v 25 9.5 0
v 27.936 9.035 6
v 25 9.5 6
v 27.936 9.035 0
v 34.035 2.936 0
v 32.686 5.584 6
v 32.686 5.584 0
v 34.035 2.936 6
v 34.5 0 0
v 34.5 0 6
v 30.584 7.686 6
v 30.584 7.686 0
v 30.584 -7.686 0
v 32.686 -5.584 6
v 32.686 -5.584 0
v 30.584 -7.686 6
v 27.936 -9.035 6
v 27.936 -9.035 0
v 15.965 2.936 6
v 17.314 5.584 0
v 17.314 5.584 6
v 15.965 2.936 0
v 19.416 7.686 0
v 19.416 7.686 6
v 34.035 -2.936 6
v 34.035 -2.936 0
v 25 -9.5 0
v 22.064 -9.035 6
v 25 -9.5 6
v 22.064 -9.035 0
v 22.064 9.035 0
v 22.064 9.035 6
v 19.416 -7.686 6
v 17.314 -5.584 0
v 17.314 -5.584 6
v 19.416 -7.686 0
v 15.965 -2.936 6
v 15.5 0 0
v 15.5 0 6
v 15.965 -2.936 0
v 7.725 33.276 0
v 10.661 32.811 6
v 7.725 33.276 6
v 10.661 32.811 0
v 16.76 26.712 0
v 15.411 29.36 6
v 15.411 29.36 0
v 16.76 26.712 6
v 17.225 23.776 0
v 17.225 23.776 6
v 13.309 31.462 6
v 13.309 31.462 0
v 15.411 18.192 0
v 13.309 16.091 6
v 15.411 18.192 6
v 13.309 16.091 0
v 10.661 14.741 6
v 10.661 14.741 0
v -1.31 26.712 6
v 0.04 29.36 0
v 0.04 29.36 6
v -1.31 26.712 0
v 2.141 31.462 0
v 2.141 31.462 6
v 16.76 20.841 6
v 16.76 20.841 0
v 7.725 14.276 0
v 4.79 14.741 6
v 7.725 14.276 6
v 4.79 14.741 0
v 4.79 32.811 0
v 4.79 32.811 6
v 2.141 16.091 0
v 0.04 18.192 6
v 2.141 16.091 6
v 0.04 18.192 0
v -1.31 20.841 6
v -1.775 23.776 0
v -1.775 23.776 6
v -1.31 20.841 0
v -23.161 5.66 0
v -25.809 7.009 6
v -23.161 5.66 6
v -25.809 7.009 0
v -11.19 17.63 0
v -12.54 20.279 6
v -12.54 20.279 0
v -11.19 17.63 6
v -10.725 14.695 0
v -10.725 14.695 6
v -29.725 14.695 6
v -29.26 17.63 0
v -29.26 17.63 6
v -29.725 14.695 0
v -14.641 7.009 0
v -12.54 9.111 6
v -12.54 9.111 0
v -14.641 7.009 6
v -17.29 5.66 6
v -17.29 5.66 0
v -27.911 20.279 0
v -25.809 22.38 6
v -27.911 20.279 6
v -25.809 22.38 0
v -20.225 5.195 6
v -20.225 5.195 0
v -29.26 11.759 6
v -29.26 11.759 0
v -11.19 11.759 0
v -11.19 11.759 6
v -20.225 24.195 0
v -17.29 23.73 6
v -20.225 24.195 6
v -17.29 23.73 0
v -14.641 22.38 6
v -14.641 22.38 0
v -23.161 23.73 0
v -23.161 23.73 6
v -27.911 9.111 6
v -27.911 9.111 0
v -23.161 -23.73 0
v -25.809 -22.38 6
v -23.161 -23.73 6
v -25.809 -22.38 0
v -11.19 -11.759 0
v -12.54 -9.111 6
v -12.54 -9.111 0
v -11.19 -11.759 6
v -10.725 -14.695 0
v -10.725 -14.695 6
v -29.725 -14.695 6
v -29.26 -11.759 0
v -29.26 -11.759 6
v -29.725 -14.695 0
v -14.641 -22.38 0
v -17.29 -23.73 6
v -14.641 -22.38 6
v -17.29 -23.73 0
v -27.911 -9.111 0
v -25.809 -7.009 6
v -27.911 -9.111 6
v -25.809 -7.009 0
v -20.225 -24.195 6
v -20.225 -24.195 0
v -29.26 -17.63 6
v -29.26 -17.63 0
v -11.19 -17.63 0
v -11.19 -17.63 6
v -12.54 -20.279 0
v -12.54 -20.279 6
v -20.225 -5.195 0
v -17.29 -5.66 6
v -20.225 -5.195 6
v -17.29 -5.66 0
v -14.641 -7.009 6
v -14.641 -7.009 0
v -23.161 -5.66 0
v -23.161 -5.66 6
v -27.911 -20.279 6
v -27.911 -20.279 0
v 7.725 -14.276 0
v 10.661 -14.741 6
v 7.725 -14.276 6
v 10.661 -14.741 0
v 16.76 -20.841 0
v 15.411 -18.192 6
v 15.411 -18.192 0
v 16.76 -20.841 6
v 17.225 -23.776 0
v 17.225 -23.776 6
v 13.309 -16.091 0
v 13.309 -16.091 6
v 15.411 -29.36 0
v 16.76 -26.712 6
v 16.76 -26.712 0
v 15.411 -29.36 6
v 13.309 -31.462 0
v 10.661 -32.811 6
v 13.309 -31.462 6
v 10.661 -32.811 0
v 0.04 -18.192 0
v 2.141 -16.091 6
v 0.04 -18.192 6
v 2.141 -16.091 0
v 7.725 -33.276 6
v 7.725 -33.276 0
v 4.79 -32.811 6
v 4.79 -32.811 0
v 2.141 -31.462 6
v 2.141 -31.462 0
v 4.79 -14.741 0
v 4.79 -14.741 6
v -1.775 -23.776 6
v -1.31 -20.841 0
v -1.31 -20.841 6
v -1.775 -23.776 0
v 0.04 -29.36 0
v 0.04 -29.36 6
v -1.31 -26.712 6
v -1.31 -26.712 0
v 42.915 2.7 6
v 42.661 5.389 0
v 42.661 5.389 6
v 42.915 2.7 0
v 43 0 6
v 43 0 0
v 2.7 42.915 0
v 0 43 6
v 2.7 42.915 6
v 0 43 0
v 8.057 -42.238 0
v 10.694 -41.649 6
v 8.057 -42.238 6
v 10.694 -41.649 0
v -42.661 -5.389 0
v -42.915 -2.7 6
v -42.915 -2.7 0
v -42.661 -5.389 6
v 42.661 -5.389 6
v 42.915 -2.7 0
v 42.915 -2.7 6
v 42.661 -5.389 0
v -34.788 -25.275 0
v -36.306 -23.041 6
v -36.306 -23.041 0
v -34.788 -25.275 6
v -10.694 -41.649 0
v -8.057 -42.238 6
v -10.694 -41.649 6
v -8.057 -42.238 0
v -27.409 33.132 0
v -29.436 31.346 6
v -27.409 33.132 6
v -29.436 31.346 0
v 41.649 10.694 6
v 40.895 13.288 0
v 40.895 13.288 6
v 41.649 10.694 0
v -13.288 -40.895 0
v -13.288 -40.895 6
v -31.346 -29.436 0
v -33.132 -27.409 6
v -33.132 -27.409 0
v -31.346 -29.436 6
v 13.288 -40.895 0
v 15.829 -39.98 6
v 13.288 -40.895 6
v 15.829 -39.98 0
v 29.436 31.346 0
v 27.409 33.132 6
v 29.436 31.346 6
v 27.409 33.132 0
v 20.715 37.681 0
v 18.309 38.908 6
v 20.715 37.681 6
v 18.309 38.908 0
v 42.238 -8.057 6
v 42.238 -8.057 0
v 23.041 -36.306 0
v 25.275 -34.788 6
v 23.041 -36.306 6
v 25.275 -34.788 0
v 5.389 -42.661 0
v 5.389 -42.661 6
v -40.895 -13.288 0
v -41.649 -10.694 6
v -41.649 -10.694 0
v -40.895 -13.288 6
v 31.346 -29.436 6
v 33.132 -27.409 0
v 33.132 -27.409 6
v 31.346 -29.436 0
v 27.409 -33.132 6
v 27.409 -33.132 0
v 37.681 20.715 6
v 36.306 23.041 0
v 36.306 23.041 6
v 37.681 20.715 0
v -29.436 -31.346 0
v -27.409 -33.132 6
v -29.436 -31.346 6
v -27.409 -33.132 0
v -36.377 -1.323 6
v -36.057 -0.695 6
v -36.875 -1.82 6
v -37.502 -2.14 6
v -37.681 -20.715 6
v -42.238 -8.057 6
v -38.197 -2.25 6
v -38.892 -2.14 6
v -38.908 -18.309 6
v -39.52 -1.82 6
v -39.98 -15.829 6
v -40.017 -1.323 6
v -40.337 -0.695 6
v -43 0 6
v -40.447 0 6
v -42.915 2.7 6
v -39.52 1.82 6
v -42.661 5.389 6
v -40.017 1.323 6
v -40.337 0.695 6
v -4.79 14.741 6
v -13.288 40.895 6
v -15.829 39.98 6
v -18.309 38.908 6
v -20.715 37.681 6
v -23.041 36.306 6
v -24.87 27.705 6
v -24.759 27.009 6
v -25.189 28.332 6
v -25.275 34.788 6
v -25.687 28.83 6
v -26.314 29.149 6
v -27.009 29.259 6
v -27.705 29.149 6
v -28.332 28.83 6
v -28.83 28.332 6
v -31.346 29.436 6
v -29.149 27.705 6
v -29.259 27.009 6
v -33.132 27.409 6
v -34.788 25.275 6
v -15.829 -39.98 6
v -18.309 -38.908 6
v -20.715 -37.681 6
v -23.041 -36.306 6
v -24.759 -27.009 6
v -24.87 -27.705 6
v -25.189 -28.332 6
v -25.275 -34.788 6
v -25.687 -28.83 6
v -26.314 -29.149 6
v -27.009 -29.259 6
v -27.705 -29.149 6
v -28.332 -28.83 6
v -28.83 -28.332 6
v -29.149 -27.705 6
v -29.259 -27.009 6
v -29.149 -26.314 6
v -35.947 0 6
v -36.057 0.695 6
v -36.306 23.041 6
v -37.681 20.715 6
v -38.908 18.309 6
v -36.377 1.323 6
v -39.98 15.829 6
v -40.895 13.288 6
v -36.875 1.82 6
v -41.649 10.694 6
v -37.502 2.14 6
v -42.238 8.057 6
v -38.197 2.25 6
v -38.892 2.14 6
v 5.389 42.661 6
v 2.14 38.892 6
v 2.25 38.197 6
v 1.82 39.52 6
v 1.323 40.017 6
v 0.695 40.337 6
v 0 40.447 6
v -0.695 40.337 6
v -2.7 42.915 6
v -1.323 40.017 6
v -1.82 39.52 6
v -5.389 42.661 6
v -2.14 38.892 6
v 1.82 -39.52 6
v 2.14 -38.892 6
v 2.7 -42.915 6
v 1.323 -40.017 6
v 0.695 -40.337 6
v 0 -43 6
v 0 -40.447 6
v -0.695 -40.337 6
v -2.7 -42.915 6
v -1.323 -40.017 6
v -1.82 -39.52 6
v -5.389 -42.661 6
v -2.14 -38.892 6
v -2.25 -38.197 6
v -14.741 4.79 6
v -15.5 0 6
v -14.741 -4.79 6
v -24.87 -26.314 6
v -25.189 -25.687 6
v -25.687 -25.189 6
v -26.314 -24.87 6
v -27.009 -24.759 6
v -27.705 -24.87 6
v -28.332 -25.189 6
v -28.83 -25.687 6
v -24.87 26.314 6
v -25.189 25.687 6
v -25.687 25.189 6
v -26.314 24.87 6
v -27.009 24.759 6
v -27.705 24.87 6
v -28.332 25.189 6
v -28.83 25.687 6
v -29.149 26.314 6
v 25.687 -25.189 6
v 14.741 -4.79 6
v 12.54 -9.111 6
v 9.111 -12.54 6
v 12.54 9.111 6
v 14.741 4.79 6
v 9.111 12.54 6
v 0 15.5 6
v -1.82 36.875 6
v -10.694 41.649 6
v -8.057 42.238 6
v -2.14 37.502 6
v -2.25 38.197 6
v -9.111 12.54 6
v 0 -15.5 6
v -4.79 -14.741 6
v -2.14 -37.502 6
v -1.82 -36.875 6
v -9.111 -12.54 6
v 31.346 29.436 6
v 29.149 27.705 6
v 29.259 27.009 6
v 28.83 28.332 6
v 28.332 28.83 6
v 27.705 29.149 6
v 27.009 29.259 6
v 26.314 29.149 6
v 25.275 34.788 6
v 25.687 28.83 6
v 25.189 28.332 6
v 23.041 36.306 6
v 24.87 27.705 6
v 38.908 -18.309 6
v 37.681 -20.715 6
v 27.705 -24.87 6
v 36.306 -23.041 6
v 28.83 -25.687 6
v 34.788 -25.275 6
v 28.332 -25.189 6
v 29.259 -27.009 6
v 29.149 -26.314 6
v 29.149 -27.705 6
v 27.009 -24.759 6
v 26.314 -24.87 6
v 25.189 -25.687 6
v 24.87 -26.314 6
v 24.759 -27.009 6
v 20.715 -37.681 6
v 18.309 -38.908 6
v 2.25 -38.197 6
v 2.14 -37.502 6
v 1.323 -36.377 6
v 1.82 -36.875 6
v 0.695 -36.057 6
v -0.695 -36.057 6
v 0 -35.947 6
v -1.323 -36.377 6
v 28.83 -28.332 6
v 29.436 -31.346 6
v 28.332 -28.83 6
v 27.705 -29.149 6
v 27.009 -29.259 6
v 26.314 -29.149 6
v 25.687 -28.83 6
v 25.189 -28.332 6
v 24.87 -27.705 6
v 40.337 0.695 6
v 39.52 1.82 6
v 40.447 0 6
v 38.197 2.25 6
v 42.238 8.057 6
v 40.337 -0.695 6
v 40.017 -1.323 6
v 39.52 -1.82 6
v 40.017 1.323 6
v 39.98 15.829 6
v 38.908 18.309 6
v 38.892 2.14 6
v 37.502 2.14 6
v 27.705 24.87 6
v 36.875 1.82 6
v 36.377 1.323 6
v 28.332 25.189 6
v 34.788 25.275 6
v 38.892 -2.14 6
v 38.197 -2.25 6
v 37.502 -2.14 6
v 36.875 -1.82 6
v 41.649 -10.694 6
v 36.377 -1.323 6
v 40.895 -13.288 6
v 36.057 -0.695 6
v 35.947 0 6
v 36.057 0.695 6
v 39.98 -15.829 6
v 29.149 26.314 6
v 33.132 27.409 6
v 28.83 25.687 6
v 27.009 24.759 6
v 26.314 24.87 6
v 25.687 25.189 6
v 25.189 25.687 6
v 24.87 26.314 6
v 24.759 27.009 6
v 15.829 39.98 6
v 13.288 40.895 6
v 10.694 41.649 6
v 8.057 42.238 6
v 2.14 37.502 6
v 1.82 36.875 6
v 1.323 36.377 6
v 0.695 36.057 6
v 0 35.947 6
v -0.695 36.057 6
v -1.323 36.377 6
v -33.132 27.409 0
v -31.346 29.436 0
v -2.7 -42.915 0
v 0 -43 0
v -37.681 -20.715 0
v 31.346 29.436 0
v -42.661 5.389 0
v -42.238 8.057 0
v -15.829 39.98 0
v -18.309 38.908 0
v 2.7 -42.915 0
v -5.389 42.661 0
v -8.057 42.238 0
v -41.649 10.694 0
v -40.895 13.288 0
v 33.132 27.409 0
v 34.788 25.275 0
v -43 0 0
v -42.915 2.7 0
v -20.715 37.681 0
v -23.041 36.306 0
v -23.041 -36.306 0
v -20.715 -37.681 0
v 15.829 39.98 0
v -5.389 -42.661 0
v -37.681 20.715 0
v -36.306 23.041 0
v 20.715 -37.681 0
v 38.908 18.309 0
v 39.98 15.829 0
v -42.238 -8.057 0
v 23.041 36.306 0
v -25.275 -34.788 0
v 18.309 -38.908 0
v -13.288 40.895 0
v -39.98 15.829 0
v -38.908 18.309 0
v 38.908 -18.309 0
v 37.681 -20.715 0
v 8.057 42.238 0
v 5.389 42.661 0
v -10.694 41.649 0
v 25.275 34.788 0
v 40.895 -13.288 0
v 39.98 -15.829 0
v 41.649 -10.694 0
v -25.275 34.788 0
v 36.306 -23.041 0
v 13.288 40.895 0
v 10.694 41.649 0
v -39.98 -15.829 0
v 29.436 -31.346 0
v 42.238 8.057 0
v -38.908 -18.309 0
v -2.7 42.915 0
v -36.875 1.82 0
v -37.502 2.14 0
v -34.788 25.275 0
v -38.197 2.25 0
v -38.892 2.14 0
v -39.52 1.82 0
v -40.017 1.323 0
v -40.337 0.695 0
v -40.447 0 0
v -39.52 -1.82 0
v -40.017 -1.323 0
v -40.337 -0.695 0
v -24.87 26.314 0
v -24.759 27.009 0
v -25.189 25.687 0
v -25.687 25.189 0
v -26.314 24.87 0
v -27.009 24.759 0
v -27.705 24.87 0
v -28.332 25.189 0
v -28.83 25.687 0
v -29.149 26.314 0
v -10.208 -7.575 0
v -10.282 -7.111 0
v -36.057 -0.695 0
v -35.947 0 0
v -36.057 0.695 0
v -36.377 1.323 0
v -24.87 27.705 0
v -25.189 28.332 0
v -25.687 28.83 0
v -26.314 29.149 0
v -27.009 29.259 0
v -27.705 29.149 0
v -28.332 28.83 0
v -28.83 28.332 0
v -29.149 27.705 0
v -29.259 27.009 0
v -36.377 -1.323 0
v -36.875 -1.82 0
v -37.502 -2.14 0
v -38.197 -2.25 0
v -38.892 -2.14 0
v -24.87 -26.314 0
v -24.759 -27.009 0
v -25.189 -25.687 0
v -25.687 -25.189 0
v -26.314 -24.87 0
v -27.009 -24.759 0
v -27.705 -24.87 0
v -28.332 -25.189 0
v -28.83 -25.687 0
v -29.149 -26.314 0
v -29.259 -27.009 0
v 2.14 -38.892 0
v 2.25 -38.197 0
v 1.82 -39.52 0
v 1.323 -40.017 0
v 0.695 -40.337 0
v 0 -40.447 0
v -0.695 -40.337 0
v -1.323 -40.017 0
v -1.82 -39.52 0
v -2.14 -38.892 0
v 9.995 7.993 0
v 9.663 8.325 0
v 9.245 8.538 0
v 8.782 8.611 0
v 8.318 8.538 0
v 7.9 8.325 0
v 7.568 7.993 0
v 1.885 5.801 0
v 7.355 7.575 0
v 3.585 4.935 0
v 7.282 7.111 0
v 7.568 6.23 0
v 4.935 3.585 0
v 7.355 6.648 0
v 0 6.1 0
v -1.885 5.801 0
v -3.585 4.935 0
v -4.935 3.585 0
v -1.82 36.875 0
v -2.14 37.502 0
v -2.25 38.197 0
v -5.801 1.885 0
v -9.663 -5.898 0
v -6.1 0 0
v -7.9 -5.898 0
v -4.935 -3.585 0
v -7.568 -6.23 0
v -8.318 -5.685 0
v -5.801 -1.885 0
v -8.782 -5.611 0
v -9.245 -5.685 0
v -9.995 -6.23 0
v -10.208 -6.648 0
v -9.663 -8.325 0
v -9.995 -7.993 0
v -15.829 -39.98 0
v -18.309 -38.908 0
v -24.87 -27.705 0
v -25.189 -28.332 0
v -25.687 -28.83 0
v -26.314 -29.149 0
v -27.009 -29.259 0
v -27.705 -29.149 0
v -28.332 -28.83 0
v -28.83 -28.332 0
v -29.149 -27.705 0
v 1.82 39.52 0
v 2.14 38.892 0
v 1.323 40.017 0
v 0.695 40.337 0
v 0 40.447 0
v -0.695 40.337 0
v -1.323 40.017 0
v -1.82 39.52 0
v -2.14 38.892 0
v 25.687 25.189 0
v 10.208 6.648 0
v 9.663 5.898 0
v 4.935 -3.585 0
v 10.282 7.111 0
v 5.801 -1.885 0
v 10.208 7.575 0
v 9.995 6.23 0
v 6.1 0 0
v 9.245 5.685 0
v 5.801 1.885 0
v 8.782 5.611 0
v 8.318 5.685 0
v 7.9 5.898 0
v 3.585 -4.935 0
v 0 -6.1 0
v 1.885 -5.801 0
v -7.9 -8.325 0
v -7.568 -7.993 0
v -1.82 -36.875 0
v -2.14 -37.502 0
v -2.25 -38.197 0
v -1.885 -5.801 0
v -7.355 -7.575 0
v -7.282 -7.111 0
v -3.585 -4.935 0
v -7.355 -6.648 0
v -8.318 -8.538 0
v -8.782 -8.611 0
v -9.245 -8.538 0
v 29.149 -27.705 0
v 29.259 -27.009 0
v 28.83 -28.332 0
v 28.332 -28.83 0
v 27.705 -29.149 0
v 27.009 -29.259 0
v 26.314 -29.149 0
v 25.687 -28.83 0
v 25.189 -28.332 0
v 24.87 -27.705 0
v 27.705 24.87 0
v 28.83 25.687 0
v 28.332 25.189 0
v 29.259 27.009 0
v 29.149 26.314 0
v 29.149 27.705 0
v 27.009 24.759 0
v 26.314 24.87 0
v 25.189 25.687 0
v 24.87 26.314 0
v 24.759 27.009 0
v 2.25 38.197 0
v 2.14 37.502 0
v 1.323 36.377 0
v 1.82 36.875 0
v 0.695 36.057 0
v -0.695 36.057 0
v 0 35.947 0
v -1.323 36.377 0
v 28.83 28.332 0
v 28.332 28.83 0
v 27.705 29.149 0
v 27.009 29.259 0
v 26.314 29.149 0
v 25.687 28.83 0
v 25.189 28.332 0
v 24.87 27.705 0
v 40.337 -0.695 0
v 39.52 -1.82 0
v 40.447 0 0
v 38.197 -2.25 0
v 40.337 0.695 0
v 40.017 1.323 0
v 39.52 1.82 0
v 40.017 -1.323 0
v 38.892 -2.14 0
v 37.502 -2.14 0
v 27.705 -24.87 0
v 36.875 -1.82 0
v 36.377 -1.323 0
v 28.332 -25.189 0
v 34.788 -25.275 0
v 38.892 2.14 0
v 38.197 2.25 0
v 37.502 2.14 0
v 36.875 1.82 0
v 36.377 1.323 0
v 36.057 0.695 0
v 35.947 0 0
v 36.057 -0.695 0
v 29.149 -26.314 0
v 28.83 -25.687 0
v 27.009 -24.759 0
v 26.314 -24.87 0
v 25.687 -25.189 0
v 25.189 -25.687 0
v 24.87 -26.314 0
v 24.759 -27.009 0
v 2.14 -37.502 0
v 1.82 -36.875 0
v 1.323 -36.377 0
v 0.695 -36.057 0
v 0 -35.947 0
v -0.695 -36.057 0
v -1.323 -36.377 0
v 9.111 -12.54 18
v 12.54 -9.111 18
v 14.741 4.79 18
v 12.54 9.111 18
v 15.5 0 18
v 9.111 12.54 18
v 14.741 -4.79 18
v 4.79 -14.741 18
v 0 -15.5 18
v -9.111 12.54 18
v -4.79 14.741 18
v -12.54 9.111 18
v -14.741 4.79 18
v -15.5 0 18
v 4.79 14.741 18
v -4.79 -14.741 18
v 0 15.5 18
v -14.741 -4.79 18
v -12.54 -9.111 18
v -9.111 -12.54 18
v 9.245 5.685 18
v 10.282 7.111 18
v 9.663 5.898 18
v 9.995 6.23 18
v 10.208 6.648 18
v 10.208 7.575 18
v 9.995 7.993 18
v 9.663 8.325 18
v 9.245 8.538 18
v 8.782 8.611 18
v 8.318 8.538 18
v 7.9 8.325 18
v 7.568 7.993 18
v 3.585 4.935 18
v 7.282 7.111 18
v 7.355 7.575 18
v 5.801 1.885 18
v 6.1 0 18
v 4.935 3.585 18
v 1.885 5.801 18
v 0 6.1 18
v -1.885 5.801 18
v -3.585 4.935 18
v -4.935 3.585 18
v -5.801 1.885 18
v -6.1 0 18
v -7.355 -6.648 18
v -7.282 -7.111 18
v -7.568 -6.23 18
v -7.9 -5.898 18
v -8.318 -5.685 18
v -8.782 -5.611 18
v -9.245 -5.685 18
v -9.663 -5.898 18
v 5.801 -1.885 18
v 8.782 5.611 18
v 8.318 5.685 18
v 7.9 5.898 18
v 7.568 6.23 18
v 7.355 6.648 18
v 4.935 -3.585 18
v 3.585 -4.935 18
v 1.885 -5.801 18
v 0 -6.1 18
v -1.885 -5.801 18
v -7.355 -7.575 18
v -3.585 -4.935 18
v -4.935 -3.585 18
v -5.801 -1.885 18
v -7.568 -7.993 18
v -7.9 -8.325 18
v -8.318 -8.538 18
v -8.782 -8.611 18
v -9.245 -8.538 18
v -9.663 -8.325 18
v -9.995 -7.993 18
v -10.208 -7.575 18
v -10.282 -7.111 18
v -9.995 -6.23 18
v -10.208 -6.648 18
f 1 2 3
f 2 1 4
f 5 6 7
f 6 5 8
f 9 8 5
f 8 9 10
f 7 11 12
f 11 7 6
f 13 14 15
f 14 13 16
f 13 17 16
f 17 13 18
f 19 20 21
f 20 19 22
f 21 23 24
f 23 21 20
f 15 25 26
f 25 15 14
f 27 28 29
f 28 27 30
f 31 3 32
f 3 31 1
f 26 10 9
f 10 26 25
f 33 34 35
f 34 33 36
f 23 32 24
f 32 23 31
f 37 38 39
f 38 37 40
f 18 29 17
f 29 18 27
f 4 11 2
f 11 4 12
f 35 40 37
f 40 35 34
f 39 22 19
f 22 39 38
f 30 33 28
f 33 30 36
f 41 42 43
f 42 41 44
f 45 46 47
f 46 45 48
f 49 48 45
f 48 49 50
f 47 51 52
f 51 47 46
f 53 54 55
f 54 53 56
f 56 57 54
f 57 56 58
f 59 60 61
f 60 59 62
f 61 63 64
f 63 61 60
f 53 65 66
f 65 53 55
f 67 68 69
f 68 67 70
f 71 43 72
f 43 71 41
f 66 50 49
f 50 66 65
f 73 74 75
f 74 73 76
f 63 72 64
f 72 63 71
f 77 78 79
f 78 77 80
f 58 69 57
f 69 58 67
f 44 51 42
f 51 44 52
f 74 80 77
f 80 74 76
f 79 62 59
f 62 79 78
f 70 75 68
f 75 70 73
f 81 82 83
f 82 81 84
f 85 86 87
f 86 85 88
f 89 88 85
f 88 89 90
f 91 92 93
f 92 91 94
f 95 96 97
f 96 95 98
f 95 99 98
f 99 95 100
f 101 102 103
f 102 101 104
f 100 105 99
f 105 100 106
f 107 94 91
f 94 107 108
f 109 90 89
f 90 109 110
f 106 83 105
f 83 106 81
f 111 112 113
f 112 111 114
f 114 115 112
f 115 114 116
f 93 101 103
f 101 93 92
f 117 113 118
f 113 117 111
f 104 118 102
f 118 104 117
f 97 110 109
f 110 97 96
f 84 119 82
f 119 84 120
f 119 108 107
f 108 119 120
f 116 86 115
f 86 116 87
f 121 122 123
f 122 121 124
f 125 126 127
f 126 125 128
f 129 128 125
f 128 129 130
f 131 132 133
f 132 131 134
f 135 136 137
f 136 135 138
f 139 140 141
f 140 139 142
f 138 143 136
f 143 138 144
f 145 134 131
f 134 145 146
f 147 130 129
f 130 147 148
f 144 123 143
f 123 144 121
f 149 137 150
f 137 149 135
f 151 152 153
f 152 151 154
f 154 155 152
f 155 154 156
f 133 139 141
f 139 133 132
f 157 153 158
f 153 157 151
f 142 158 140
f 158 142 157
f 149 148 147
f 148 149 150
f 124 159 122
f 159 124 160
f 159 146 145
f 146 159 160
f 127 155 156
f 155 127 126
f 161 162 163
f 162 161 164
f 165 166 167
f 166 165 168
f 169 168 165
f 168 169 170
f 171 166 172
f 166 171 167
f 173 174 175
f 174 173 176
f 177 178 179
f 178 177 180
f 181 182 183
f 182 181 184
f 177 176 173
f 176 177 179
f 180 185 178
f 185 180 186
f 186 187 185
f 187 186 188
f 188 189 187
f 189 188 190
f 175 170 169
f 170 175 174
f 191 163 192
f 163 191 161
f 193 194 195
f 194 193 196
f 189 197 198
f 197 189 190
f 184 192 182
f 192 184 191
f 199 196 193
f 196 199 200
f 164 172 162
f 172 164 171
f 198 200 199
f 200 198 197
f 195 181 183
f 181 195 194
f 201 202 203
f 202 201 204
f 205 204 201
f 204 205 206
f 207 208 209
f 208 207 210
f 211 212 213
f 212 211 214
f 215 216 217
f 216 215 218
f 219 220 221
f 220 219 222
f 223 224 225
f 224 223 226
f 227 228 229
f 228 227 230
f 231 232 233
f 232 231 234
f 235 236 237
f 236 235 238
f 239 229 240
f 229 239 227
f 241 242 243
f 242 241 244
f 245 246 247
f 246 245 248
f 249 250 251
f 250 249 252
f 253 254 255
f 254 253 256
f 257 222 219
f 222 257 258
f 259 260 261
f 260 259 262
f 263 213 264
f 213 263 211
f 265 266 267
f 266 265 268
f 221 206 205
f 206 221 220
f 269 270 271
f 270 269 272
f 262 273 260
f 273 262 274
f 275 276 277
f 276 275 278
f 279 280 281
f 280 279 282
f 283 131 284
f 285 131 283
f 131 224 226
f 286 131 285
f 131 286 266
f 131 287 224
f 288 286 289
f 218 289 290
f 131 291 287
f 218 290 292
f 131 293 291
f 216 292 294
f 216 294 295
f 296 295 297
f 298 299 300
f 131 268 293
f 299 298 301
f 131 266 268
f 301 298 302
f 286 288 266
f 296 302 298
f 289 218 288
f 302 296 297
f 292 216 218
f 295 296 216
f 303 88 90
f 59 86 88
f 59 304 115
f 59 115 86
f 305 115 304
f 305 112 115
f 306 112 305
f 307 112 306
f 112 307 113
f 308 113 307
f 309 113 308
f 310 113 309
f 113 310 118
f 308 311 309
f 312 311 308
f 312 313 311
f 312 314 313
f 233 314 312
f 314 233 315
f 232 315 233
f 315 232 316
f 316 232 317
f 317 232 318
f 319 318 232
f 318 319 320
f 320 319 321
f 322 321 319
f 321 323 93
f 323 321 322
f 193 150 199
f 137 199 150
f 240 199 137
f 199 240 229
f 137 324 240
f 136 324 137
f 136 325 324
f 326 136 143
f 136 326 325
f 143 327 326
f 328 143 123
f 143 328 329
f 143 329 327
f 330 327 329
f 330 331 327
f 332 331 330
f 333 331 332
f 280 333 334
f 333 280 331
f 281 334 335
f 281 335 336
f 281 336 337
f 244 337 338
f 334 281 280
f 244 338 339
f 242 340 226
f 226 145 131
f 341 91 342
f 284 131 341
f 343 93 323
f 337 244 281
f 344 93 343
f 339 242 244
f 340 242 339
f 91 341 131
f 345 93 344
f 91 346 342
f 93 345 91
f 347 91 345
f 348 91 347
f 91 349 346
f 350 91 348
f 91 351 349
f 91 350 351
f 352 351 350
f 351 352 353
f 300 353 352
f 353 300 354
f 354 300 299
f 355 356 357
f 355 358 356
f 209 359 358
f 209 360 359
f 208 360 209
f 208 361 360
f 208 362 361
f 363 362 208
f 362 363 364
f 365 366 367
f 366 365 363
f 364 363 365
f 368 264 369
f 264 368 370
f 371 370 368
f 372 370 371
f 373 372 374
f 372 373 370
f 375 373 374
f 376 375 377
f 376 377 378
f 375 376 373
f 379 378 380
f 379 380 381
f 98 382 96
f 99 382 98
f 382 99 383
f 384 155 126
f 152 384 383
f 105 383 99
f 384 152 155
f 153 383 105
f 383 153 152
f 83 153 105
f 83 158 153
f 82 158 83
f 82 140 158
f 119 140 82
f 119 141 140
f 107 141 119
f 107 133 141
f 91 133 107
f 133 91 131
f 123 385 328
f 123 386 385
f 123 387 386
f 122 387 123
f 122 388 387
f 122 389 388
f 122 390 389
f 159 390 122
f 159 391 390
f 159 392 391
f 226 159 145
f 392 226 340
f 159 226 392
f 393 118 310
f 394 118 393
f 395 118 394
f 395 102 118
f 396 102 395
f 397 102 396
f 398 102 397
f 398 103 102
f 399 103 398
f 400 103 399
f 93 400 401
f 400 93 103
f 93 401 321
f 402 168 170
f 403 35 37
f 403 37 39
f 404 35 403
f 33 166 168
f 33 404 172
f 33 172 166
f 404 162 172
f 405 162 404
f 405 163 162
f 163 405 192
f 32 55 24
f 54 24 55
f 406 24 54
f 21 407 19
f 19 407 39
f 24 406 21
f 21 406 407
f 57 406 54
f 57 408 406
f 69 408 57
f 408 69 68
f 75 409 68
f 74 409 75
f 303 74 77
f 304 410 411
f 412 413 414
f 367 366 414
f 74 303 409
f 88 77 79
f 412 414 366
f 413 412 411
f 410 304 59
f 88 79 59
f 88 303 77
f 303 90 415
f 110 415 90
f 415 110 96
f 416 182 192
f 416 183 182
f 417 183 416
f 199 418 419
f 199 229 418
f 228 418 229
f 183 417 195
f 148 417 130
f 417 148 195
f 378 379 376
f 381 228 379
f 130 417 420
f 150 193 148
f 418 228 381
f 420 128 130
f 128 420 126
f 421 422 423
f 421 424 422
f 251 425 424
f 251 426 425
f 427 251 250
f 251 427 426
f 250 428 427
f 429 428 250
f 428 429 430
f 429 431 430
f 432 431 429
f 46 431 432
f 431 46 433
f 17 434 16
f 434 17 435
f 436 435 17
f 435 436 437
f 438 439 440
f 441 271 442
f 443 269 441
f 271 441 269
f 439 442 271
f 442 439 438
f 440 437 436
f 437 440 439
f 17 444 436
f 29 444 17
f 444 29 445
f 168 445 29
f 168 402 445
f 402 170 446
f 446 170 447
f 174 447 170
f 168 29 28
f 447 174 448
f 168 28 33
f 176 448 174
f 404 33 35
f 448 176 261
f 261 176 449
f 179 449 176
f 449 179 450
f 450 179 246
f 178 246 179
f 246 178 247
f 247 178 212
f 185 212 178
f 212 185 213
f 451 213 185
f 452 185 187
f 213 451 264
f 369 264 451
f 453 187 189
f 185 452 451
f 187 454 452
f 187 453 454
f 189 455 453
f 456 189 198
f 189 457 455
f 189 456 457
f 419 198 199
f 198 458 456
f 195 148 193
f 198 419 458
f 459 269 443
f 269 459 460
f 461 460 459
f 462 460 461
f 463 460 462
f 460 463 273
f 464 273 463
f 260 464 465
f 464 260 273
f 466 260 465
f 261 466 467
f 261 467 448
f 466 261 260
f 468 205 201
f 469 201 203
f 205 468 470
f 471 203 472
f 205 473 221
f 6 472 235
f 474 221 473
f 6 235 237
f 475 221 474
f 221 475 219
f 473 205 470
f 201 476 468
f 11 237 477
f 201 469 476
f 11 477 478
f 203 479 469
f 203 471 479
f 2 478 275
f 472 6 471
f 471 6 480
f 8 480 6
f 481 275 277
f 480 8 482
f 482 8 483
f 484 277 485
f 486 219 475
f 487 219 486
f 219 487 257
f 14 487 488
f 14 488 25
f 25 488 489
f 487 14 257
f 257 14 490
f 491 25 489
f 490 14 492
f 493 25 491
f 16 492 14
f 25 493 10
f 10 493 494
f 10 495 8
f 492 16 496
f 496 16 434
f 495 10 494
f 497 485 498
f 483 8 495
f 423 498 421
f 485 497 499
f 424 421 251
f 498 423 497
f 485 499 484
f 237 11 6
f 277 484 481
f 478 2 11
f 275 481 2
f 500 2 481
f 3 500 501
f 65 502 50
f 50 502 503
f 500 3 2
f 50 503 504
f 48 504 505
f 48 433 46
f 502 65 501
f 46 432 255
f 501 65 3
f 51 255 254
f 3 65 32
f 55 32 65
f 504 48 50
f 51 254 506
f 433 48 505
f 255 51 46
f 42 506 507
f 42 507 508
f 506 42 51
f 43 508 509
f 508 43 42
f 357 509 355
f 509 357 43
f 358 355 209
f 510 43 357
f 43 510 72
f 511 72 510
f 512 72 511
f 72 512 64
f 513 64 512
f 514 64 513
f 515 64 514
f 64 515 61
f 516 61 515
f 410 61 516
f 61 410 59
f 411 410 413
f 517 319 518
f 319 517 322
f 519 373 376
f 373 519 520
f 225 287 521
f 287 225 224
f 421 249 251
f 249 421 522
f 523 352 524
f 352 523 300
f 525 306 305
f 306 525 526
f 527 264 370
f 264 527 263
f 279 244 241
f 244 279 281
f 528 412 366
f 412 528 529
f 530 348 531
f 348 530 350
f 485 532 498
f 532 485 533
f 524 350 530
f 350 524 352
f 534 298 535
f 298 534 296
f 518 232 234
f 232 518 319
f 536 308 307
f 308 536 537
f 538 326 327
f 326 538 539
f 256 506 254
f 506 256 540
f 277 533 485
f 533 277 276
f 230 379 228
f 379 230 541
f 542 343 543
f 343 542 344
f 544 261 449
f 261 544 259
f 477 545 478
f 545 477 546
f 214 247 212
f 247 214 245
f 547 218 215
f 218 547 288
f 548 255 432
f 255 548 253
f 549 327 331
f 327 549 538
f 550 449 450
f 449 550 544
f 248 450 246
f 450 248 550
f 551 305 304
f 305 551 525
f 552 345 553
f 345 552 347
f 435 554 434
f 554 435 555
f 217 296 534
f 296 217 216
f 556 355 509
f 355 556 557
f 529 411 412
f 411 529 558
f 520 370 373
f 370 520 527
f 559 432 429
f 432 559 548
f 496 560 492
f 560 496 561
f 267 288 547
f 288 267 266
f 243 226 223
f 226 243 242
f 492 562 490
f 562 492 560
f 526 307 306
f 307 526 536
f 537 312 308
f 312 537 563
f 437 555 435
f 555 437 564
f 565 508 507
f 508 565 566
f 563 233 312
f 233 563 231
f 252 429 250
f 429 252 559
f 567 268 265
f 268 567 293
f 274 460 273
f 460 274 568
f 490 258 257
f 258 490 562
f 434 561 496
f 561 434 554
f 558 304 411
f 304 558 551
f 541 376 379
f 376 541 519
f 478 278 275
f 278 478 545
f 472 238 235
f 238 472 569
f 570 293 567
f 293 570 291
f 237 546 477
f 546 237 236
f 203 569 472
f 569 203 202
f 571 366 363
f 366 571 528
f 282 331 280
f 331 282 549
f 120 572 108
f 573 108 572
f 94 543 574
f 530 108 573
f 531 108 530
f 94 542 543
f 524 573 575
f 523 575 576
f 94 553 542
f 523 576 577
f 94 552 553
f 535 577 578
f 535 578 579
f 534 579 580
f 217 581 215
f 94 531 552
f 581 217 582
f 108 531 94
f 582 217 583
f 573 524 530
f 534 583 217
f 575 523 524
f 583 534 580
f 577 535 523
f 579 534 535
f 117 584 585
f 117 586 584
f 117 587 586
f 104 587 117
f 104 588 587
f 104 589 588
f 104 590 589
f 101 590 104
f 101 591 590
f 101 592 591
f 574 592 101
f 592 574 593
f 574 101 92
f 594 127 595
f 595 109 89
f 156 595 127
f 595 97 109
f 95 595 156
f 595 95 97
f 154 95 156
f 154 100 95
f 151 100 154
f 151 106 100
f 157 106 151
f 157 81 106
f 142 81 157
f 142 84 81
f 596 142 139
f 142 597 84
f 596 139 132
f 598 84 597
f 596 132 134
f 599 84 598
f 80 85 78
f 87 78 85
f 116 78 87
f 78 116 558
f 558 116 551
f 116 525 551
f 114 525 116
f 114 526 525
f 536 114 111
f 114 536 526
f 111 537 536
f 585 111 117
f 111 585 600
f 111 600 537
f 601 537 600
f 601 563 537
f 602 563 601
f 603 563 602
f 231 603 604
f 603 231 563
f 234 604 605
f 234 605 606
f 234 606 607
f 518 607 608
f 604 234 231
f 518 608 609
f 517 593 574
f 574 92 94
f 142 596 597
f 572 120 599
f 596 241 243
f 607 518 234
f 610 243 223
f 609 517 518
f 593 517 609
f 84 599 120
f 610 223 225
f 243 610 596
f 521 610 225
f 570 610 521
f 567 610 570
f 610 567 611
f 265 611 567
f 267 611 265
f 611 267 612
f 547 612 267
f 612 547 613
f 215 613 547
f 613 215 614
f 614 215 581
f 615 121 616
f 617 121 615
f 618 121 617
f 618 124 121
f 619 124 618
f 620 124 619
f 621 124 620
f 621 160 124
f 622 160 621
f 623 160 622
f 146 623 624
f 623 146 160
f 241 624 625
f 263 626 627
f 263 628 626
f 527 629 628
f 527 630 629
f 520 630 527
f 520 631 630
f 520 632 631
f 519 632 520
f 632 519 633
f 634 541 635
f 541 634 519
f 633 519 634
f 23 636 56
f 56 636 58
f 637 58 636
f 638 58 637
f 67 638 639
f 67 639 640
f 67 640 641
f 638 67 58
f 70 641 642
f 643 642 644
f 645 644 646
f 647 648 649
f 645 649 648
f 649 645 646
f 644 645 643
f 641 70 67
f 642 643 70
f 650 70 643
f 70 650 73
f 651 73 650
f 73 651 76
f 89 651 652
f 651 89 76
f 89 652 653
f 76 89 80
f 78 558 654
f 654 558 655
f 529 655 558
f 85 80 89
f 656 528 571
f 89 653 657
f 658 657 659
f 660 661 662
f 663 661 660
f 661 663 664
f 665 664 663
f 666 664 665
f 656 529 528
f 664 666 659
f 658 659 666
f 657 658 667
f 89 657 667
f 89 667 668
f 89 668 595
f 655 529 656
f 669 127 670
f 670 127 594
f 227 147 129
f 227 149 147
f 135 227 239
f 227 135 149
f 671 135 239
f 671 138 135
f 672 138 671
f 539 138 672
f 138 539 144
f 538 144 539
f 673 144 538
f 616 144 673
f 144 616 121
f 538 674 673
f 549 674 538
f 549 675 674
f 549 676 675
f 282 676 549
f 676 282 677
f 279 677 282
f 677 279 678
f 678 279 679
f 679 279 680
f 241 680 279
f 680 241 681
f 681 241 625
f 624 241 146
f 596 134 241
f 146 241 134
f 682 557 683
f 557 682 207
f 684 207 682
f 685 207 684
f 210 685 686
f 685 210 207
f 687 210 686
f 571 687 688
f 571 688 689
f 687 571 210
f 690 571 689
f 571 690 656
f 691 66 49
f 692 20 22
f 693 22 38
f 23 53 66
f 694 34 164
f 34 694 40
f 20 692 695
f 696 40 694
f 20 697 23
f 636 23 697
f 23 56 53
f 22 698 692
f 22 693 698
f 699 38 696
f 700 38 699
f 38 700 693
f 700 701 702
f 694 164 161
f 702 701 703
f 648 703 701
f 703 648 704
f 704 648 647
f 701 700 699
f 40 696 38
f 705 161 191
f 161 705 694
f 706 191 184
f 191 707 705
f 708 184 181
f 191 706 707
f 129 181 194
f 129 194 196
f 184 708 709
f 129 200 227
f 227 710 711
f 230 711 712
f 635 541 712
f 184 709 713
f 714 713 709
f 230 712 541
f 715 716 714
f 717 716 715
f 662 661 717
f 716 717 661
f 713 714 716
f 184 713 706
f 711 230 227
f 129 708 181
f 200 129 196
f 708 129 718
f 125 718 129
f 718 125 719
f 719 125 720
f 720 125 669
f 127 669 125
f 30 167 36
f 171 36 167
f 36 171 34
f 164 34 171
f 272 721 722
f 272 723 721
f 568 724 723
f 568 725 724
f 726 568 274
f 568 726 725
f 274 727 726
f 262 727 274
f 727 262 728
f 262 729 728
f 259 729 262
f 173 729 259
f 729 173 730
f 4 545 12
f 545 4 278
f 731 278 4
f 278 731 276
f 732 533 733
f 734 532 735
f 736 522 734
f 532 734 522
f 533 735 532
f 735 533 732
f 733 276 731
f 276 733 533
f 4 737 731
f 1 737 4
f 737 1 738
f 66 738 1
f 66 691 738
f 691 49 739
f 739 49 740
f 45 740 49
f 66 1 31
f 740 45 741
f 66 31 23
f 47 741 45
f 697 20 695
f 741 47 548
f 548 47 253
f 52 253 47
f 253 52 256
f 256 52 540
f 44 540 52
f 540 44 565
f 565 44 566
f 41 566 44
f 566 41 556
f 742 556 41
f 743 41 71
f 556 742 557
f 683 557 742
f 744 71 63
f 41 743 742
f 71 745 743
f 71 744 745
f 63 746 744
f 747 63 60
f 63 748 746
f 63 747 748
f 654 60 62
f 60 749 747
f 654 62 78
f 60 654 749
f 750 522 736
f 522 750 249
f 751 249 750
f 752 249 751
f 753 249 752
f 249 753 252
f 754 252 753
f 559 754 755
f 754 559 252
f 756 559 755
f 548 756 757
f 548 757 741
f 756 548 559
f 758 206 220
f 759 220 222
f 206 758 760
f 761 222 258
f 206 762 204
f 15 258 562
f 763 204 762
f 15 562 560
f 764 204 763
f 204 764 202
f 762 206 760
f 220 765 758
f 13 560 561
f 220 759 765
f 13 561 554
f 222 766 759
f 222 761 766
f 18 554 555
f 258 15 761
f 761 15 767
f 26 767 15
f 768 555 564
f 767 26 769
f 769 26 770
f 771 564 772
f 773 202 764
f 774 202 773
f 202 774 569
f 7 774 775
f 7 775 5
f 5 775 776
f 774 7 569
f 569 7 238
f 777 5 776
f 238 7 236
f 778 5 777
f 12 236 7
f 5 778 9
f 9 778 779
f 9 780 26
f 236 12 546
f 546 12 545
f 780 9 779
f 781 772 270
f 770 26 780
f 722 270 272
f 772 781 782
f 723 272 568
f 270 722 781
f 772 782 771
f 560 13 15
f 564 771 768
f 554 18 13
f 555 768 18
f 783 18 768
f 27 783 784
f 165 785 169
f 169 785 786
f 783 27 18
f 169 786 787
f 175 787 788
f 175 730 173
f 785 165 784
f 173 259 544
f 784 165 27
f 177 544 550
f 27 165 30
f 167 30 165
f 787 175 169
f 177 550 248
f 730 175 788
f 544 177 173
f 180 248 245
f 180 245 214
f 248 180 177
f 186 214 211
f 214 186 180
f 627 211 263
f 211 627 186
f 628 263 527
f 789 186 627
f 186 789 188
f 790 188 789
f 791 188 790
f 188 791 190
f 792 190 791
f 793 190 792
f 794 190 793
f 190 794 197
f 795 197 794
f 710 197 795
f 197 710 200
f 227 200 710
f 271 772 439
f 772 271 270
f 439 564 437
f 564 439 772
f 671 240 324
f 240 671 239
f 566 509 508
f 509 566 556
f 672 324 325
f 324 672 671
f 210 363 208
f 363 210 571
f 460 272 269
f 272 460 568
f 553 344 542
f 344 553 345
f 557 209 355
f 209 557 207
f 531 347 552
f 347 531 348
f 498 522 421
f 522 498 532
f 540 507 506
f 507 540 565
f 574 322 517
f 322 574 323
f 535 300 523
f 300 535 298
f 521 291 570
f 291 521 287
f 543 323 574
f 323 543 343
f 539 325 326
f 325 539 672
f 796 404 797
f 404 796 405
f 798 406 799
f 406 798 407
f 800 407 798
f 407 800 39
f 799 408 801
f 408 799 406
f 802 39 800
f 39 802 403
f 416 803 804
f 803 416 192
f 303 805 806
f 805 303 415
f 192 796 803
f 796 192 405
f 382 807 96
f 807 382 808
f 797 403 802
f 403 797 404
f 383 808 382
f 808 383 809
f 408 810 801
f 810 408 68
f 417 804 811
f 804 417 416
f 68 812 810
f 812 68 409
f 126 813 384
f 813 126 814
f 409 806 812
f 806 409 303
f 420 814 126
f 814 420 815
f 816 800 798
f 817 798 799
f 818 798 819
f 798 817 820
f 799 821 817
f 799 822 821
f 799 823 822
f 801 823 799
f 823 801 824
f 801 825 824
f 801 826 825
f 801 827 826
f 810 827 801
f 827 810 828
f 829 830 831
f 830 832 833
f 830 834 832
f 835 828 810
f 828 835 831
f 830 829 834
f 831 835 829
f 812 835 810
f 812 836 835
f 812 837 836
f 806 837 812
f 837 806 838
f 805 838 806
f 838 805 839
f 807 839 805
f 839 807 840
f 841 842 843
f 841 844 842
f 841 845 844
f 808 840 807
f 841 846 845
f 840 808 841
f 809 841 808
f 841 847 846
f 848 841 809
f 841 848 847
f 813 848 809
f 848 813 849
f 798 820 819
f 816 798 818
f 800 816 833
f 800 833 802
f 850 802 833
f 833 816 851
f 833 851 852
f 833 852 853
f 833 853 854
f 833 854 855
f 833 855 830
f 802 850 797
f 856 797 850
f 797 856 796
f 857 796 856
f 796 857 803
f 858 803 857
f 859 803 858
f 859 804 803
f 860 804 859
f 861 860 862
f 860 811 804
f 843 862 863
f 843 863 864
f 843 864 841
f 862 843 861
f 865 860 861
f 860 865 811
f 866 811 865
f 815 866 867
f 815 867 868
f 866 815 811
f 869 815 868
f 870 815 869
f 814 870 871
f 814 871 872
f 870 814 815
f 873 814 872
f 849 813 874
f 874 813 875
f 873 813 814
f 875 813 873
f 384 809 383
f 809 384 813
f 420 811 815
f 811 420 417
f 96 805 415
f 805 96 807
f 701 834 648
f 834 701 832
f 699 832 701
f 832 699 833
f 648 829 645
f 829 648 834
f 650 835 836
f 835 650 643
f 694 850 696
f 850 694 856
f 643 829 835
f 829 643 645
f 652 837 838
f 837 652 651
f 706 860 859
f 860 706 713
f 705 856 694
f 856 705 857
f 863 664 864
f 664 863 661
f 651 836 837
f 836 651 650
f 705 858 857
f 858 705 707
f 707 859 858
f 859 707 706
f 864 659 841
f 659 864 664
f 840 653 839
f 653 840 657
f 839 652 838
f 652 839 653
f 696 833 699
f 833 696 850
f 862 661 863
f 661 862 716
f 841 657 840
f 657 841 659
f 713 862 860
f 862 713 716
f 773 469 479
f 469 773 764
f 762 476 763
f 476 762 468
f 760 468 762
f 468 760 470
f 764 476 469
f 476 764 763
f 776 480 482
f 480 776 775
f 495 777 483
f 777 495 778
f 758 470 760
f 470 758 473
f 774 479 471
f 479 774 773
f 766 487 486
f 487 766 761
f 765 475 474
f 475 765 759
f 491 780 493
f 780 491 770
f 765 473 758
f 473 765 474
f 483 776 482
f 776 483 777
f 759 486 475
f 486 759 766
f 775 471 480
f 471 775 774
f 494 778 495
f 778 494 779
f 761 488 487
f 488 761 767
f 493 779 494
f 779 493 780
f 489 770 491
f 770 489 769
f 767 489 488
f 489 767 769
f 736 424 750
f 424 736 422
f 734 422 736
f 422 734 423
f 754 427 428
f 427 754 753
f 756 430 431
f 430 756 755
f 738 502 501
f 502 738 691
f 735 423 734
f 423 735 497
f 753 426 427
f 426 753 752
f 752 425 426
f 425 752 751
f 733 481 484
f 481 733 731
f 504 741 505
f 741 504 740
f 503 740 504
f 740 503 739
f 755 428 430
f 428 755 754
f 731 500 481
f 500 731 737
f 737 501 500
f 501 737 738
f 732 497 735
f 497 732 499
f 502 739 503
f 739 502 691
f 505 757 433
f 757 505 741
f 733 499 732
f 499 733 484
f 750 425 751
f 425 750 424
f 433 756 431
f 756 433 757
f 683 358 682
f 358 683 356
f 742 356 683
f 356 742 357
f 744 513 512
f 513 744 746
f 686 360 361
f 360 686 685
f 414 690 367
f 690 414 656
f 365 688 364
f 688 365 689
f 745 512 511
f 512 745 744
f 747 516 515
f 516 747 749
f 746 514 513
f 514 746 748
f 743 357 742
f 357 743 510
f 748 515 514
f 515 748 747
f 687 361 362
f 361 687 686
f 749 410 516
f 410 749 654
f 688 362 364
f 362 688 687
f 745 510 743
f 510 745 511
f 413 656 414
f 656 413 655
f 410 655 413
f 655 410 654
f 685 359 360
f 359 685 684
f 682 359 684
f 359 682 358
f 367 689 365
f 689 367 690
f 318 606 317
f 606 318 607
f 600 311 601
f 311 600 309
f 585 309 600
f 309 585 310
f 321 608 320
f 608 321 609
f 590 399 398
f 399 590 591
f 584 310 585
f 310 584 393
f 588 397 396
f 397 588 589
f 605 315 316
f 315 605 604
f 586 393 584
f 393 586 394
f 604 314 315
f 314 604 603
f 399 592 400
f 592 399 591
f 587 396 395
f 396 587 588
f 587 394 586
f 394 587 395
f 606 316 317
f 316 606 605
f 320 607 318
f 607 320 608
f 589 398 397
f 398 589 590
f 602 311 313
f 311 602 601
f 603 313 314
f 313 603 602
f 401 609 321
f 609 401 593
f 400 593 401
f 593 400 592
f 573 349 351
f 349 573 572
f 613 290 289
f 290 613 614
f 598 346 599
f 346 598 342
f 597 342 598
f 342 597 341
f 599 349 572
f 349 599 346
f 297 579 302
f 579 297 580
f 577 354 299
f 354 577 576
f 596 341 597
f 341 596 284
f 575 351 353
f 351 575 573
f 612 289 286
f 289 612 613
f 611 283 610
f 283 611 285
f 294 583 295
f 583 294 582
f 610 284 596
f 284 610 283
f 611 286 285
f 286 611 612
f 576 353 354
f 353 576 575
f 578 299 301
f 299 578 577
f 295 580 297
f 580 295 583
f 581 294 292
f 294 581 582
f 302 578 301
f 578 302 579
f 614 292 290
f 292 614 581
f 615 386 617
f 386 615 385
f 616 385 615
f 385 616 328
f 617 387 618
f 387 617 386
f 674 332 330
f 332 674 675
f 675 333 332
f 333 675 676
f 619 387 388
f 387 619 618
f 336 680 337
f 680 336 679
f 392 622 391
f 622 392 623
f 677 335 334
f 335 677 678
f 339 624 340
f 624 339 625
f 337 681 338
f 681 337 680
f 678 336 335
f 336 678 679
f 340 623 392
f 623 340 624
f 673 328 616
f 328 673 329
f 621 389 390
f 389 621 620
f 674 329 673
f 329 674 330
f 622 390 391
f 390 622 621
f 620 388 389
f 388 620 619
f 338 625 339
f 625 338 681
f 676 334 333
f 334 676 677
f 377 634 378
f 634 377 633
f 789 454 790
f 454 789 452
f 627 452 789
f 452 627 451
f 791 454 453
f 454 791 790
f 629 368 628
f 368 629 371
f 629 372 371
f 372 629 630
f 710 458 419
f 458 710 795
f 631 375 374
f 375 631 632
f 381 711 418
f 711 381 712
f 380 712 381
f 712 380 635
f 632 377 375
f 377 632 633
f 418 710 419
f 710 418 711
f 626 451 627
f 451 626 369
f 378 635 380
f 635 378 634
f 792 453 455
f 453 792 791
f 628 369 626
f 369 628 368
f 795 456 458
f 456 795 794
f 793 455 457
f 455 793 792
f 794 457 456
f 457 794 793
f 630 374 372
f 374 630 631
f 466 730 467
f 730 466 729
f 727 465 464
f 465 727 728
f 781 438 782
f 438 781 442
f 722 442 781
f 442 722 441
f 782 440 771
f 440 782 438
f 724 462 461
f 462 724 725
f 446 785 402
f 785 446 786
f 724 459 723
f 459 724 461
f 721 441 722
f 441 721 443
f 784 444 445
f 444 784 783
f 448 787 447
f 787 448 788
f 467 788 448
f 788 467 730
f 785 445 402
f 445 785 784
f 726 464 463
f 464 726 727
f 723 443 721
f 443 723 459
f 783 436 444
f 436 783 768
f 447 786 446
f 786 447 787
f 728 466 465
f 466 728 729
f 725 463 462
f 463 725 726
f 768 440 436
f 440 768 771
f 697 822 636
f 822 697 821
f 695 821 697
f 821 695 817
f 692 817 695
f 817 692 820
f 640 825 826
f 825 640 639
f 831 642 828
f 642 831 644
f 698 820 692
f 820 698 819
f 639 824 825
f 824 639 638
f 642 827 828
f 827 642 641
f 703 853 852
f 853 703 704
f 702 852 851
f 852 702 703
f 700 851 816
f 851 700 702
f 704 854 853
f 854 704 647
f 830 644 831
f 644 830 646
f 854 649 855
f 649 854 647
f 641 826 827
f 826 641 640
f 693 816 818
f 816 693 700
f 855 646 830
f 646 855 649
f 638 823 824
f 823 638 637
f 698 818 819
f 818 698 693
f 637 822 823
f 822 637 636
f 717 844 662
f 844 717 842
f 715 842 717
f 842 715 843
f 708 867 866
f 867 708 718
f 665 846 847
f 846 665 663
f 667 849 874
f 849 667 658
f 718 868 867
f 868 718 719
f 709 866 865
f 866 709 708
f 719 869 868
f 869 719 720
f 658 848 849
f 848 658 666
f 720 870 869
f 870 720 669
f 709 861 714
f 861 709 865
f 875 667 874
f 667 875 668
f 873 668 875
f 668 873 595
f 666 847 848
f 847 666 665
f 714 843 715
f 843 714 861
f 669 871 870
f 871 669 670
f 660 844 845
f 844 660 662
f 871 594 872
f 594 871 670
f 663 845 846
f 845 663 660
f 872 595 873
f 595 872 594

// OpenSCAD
//RUEDA con radios 
//parametros rueda

//medidas del aro externo de la rueda.
diametro=86; //diametro externo de la rueda. influye en la velocidad.
grosor=6;	// grosor del aro externo de la rueda

//medidas de los radios
//grosor_radios=8; //grosor o altura de los radios

//medidas del hub central
grosor_hub=12; //grosor o altura del hub central. minimo grosor_tuerca+1
diam_hub=31;	//diametro del hub
diametro_tuerca=16.8; //diametro mayor, entre picos, de la tuerca
grosor_tuerca=6; //grosor o altura de la tuerca
diam_eje=5;  //eje central por el que pasa el tornillo de izquierdas
diam_eje_motor=9.6; //diametro del eje motor
diam_eje_mandril=12; //diametro del eje del mandril
casquillo=12.2;

//medidas de las cadenas
dientes=8; //numero de dientes de la rueda
paso=30; //distacia entre las tuercas o dientes de la cadena

//medidas de los agujeros del hub
tornillohub=2;
pasohub=diametro_tuerca+5.8;
metrica_hub=3;

//exterior (1) interior (2) suplementos(3) tensora exterior(4) tensora interior (5)
pos_rueda=4;



angulodientes=360/dientes;
distanciadientes=paso*dientes/3.141592;

angulohub=360/tornillohub;
distanciahub=pasohub*tornillohub/3.141592;

module rueda(gros=grosor, diam=diametro, diam_axis=diam_eje,diam_tuerca=diametro_tuerca)
{
	difference(){
		union(){
			difference(){
			//rueda
				
				//parte exterior y radios
				cylinder (r=diam/2, h=gros, $fn=100);
				//translate([0,0,grosor_radios])
				//cylinder (r=(diam-20)/2, h=100, $fn=100);
				//vaciado de radios
				if (pos_rueda!=3){
					for (i=[0:4]) 
					{
					translate([(25)*cos(72*i),(25)*sin(72*i),-1])
					cylinder(r=(38)/4, h=100, $fn=20);
		
					}//fin for
				}
						
			}// fin diference
			//cilindro del hub	
			//si es rueda externa hub alto
			if (pos_rueda==1){
					cylinder (r=diam_hub/2, h=grosor_hub+grosor, $fn=20);
			}
			//si es rueda interna hub bajo
			if (pos_rueda==2){
					cylinder (r=diam_hub/2, h=grosor, $fn=20);
			}
			
			if (pos_rueda==4){
					cylinder (r=diam_hub/2, h=grosor_hub+grosor, $fn=20);
			}
		}// fin union
			if (pos_rueda==1){
				//taladro
				cylinder(r=diam_axis/2, h=80, $fn=30, center=true);
				//tuerca
				translate ([0,0,grosor])
				cylinder(r=diam_tuerca/2, h=grosor+grosor_hub+2, $fn=6);
				//agujero resto hub
				translate ([0,0,grosor+grosor_tuerca])
				cylinder(r=(diam_tuerca+1)/2, h=grosor+grosor_hub+2, $fn=20);
			}
			if (pos_rueda==2){
				//cylinder(r=diam_eje_mandril/2, h=80, $fn=30, center=true);
				//translate ([0,0,grosor-2])
				cylinder(r=(diam_tuerca)/2, h=grosor*5, $fn=20, center=true);
			}
			if (pos_rueda==4){
				//cylinder(r=diam_eje_mandril/2, h=80, $fn=30, center=true);
				//translate ([0,0,grosor-2])
				cylinder(r=casquillo/2, h=100, $fn=20, center=true);
			}
	}//fin diference
}



difference()
//union()
{
	//rueda en si
	rueda();
	//taladros
	for (i=[0:dientes-1]) 
	{
		translate([distanciadientes/2*cos(angulodientes*i),distanciadientes/2*sin(angulodientes*i),0])
		cylinder(r=4.5/2, h=100, $fn=20);
		//translate ([8*cos(angulodientes*i),8*sin(angulodientes*i),grosor])
		//rotate([0,0,angulodientes*i])
		//cube([4,distanciadientes/2,10]);
	}
	//agujeros de union de hub
	for (i=[0:tornillohub-1]) 
	{
		translate([pasohub/2*cos(angulohub*i+39),pasohub/2*sin(angulohub*i+39),0])
		cylinder(r=metrica_hub/2, h=100, $fn=20,center=true);
		//translate ([8*cos(angulodientes*i),8*sin(angulodientes*i),grosor])
		//rotate([0,0,angulodientes*i])
		//cube([4,distanciadientes/2,10]);
	}
	if (pos_rueda==3){
		cylinder(r=(diametro-20)/2, h=20, $fn=50,center=true);	
	}

}

echo("diametro de la rueda   ",diametro);
echo("diametro de los dientes    ",distanciadientes);
echo("separacion entre dientes y borde   ",(diametro-distanciadientes)/2);
echo("Velocidad teorica a 550rpm ", (diametro*3.141592*550/1000000*60));
echo("diametro del hub    ",distanciahub);

	
